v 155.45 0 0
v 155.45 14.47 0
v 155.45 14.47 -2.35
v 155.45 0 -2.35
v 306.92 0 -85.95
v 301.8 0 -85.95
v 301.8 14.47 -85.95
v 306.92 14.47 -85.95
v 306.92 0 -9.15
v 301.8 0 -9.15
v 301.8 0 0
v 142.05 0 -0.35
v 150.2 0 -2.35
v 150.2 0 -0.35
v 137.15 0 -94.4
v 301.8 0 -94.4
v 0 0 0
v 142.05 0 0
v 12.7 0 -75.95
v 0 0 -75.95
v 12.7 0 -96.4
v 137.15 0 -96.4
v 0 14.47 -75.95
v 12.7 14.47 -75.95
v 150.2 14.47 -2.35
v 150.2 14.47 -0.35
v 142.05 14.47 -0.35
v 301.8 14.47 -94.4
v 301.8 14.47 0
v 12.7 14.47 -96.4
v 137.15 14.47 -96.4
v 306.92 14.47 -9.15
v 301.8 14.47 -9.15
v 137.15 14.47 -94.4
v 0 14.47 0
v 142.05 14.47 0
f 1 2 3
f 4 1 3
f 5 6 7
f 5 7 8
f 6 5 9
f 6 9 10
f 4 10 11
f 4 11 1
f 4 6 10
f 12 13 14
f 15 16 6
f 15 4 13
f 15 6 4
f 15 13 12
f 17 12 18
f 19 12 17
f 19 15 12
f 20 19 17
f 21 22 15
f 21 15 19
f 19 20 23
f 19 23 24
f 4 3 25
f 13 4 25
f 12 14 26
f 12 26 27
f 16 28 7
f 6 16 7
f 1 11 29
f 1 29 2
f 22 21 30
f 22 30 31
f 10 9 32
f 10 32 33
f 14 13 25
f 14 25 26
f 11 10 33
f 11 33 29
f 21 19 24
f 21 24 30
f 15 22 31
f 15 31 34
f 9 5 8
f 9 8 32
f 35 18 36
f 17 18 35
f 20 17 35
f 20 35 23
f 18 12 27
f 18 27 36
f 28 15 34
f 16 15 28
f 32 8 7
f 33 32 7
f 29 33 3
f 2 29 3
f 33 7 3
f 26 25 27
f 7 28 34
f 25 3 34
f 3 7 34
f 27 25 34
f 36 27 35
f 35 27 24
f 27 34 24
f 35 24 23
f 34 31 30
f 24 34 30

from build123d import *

# Parameters (mm, degrees)
BOSS_EXTRUDE1_DEPTH = 14.47


with BuildPart() as part:
    # Sketch1 → Boss-Extrude1 (new body)
    with BuildSketch(Plane(origin=(0, 0, 0), x_dir=(1, 0, 0), z_dir=(0, 1, 0))):
        Polygon((0, 0), (0, 75.95), (12.7, 75.95), (12.7, 96.4), (137.15, 96.4), (137.15, 94.4), (301.8, 94.4), (301.8, 85.95), (306.92, 85.95), (306.92, 9.15), (301.8, 9.15), (301.8, 0), (155.45, 0), (155.45, 2.35), (150.2, 2.35), (150.2, 0.35), (142.05, 0.35), (142.05, 0), align=None)
    extrude(amount=BOSS_EXTRUDE1_DEPTH)


solid = part.part
